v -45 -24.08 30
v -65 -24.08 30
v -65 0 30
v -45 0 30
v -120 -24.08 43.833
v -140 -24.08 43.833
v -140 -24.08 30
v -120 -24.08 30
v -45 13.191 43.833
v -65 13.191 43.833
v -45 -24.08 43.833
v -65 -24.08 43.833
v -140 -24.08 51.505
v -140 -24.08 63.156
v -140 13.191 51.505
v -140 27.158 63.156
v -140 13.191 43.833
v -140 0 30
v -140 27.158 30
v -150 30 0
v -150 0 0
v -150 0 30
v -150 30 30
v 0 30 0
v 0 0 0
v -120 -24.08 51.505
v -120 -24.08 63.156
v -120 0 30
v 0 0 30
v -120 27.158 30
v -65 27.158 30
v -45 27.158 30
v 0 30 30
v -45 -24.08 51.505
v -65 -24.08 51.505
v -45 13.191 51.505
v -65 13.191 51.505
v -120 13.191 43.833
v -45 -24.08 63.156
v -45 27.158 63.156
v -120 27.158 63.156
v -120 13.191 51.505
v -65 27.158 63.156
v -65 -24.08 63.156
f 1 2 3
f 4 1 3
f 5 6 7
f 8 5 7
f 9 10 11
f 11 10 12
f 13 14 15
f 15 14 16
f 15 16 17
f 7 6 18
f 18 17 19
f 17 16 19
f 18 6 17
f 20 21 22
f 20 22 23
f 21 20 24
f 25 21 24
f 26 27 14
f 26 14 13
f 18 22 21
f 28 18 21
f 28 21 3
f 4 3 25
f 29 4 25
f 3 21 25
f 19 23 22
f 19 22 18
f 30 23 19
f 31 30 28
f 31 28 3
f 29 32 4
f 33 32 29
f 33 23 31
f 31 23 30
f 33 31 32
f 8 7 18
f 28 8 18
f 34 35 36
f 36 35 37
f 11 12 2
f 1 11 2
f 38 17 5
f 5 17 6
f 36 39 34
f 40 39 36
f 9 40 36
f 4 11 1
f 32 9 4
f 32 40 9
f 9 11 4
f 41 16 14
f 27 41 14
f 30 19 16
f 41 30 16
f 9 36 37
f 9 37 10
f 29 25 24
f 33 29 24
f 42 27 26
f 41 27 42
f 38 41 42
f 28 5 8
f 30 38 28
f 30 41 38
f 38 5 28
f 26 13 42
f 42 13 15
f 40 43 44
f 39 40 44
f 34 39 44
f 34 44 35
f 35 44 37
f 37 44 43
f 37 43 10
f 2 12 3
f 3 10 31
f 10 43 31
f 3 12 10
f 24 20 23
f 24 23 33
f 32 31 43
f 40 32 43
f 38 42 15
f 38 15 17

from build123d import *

# Parameters (mm, degrees)
ESQUISSE1_W                = 150
ESQUISSE1_H                = 30
BOSS_EXTRU_1_DEPTH         = 30
BOSS_EXTRU_2_START         = -10
BOSS_EXTRU_2_DEPTH         = 20
R_P_TITION_LIN_AIRE1_COUNT = 2
R_P_TITION_LIN_AIRE1_PITCH = 75


with BuildPart() as part:
    # Esquisse1 → Boss.-Extru.1 (new body)
    with BuildSketch(Plane.XY):
        with Locations((-75, 15)):
            Rectangle(ESQUISSE1_W, ESQUISSE1_H)
    extrude(amount=BOSS_EXTRU_1_DEPTH)

    # Esquisse2 → Boss.-Extru.2 (add)
    with BuildSketch(Plane.ZY.offset(150).offset(BOSS_EXTRU_2_START)):
        Polygon((30, 27.158170339), (63.156193336, 27.158170339), (63.156193336, -24.079833233), (51.504613428, -24.079833233), (51.504613428, 13.190748461), (43.833386904, 13.190748461), (43.833386904, -24.079833233), (30, -24.079833233), align=None)
    boss_extru_2 = extrude(amount=-BOSS_EXTRU_2_DEPTH)

    # Répétition linéaire1: Boss.-Extru.2 ×2
    with Locations(*[(i * R_P_TITION_LIN_AIRE1_PITCH, 0, 0) for i in range(1, R_P_TITION_LIN_AIRE1_COUNT)]):
        add(boss_extru_2)


solid = part.part
